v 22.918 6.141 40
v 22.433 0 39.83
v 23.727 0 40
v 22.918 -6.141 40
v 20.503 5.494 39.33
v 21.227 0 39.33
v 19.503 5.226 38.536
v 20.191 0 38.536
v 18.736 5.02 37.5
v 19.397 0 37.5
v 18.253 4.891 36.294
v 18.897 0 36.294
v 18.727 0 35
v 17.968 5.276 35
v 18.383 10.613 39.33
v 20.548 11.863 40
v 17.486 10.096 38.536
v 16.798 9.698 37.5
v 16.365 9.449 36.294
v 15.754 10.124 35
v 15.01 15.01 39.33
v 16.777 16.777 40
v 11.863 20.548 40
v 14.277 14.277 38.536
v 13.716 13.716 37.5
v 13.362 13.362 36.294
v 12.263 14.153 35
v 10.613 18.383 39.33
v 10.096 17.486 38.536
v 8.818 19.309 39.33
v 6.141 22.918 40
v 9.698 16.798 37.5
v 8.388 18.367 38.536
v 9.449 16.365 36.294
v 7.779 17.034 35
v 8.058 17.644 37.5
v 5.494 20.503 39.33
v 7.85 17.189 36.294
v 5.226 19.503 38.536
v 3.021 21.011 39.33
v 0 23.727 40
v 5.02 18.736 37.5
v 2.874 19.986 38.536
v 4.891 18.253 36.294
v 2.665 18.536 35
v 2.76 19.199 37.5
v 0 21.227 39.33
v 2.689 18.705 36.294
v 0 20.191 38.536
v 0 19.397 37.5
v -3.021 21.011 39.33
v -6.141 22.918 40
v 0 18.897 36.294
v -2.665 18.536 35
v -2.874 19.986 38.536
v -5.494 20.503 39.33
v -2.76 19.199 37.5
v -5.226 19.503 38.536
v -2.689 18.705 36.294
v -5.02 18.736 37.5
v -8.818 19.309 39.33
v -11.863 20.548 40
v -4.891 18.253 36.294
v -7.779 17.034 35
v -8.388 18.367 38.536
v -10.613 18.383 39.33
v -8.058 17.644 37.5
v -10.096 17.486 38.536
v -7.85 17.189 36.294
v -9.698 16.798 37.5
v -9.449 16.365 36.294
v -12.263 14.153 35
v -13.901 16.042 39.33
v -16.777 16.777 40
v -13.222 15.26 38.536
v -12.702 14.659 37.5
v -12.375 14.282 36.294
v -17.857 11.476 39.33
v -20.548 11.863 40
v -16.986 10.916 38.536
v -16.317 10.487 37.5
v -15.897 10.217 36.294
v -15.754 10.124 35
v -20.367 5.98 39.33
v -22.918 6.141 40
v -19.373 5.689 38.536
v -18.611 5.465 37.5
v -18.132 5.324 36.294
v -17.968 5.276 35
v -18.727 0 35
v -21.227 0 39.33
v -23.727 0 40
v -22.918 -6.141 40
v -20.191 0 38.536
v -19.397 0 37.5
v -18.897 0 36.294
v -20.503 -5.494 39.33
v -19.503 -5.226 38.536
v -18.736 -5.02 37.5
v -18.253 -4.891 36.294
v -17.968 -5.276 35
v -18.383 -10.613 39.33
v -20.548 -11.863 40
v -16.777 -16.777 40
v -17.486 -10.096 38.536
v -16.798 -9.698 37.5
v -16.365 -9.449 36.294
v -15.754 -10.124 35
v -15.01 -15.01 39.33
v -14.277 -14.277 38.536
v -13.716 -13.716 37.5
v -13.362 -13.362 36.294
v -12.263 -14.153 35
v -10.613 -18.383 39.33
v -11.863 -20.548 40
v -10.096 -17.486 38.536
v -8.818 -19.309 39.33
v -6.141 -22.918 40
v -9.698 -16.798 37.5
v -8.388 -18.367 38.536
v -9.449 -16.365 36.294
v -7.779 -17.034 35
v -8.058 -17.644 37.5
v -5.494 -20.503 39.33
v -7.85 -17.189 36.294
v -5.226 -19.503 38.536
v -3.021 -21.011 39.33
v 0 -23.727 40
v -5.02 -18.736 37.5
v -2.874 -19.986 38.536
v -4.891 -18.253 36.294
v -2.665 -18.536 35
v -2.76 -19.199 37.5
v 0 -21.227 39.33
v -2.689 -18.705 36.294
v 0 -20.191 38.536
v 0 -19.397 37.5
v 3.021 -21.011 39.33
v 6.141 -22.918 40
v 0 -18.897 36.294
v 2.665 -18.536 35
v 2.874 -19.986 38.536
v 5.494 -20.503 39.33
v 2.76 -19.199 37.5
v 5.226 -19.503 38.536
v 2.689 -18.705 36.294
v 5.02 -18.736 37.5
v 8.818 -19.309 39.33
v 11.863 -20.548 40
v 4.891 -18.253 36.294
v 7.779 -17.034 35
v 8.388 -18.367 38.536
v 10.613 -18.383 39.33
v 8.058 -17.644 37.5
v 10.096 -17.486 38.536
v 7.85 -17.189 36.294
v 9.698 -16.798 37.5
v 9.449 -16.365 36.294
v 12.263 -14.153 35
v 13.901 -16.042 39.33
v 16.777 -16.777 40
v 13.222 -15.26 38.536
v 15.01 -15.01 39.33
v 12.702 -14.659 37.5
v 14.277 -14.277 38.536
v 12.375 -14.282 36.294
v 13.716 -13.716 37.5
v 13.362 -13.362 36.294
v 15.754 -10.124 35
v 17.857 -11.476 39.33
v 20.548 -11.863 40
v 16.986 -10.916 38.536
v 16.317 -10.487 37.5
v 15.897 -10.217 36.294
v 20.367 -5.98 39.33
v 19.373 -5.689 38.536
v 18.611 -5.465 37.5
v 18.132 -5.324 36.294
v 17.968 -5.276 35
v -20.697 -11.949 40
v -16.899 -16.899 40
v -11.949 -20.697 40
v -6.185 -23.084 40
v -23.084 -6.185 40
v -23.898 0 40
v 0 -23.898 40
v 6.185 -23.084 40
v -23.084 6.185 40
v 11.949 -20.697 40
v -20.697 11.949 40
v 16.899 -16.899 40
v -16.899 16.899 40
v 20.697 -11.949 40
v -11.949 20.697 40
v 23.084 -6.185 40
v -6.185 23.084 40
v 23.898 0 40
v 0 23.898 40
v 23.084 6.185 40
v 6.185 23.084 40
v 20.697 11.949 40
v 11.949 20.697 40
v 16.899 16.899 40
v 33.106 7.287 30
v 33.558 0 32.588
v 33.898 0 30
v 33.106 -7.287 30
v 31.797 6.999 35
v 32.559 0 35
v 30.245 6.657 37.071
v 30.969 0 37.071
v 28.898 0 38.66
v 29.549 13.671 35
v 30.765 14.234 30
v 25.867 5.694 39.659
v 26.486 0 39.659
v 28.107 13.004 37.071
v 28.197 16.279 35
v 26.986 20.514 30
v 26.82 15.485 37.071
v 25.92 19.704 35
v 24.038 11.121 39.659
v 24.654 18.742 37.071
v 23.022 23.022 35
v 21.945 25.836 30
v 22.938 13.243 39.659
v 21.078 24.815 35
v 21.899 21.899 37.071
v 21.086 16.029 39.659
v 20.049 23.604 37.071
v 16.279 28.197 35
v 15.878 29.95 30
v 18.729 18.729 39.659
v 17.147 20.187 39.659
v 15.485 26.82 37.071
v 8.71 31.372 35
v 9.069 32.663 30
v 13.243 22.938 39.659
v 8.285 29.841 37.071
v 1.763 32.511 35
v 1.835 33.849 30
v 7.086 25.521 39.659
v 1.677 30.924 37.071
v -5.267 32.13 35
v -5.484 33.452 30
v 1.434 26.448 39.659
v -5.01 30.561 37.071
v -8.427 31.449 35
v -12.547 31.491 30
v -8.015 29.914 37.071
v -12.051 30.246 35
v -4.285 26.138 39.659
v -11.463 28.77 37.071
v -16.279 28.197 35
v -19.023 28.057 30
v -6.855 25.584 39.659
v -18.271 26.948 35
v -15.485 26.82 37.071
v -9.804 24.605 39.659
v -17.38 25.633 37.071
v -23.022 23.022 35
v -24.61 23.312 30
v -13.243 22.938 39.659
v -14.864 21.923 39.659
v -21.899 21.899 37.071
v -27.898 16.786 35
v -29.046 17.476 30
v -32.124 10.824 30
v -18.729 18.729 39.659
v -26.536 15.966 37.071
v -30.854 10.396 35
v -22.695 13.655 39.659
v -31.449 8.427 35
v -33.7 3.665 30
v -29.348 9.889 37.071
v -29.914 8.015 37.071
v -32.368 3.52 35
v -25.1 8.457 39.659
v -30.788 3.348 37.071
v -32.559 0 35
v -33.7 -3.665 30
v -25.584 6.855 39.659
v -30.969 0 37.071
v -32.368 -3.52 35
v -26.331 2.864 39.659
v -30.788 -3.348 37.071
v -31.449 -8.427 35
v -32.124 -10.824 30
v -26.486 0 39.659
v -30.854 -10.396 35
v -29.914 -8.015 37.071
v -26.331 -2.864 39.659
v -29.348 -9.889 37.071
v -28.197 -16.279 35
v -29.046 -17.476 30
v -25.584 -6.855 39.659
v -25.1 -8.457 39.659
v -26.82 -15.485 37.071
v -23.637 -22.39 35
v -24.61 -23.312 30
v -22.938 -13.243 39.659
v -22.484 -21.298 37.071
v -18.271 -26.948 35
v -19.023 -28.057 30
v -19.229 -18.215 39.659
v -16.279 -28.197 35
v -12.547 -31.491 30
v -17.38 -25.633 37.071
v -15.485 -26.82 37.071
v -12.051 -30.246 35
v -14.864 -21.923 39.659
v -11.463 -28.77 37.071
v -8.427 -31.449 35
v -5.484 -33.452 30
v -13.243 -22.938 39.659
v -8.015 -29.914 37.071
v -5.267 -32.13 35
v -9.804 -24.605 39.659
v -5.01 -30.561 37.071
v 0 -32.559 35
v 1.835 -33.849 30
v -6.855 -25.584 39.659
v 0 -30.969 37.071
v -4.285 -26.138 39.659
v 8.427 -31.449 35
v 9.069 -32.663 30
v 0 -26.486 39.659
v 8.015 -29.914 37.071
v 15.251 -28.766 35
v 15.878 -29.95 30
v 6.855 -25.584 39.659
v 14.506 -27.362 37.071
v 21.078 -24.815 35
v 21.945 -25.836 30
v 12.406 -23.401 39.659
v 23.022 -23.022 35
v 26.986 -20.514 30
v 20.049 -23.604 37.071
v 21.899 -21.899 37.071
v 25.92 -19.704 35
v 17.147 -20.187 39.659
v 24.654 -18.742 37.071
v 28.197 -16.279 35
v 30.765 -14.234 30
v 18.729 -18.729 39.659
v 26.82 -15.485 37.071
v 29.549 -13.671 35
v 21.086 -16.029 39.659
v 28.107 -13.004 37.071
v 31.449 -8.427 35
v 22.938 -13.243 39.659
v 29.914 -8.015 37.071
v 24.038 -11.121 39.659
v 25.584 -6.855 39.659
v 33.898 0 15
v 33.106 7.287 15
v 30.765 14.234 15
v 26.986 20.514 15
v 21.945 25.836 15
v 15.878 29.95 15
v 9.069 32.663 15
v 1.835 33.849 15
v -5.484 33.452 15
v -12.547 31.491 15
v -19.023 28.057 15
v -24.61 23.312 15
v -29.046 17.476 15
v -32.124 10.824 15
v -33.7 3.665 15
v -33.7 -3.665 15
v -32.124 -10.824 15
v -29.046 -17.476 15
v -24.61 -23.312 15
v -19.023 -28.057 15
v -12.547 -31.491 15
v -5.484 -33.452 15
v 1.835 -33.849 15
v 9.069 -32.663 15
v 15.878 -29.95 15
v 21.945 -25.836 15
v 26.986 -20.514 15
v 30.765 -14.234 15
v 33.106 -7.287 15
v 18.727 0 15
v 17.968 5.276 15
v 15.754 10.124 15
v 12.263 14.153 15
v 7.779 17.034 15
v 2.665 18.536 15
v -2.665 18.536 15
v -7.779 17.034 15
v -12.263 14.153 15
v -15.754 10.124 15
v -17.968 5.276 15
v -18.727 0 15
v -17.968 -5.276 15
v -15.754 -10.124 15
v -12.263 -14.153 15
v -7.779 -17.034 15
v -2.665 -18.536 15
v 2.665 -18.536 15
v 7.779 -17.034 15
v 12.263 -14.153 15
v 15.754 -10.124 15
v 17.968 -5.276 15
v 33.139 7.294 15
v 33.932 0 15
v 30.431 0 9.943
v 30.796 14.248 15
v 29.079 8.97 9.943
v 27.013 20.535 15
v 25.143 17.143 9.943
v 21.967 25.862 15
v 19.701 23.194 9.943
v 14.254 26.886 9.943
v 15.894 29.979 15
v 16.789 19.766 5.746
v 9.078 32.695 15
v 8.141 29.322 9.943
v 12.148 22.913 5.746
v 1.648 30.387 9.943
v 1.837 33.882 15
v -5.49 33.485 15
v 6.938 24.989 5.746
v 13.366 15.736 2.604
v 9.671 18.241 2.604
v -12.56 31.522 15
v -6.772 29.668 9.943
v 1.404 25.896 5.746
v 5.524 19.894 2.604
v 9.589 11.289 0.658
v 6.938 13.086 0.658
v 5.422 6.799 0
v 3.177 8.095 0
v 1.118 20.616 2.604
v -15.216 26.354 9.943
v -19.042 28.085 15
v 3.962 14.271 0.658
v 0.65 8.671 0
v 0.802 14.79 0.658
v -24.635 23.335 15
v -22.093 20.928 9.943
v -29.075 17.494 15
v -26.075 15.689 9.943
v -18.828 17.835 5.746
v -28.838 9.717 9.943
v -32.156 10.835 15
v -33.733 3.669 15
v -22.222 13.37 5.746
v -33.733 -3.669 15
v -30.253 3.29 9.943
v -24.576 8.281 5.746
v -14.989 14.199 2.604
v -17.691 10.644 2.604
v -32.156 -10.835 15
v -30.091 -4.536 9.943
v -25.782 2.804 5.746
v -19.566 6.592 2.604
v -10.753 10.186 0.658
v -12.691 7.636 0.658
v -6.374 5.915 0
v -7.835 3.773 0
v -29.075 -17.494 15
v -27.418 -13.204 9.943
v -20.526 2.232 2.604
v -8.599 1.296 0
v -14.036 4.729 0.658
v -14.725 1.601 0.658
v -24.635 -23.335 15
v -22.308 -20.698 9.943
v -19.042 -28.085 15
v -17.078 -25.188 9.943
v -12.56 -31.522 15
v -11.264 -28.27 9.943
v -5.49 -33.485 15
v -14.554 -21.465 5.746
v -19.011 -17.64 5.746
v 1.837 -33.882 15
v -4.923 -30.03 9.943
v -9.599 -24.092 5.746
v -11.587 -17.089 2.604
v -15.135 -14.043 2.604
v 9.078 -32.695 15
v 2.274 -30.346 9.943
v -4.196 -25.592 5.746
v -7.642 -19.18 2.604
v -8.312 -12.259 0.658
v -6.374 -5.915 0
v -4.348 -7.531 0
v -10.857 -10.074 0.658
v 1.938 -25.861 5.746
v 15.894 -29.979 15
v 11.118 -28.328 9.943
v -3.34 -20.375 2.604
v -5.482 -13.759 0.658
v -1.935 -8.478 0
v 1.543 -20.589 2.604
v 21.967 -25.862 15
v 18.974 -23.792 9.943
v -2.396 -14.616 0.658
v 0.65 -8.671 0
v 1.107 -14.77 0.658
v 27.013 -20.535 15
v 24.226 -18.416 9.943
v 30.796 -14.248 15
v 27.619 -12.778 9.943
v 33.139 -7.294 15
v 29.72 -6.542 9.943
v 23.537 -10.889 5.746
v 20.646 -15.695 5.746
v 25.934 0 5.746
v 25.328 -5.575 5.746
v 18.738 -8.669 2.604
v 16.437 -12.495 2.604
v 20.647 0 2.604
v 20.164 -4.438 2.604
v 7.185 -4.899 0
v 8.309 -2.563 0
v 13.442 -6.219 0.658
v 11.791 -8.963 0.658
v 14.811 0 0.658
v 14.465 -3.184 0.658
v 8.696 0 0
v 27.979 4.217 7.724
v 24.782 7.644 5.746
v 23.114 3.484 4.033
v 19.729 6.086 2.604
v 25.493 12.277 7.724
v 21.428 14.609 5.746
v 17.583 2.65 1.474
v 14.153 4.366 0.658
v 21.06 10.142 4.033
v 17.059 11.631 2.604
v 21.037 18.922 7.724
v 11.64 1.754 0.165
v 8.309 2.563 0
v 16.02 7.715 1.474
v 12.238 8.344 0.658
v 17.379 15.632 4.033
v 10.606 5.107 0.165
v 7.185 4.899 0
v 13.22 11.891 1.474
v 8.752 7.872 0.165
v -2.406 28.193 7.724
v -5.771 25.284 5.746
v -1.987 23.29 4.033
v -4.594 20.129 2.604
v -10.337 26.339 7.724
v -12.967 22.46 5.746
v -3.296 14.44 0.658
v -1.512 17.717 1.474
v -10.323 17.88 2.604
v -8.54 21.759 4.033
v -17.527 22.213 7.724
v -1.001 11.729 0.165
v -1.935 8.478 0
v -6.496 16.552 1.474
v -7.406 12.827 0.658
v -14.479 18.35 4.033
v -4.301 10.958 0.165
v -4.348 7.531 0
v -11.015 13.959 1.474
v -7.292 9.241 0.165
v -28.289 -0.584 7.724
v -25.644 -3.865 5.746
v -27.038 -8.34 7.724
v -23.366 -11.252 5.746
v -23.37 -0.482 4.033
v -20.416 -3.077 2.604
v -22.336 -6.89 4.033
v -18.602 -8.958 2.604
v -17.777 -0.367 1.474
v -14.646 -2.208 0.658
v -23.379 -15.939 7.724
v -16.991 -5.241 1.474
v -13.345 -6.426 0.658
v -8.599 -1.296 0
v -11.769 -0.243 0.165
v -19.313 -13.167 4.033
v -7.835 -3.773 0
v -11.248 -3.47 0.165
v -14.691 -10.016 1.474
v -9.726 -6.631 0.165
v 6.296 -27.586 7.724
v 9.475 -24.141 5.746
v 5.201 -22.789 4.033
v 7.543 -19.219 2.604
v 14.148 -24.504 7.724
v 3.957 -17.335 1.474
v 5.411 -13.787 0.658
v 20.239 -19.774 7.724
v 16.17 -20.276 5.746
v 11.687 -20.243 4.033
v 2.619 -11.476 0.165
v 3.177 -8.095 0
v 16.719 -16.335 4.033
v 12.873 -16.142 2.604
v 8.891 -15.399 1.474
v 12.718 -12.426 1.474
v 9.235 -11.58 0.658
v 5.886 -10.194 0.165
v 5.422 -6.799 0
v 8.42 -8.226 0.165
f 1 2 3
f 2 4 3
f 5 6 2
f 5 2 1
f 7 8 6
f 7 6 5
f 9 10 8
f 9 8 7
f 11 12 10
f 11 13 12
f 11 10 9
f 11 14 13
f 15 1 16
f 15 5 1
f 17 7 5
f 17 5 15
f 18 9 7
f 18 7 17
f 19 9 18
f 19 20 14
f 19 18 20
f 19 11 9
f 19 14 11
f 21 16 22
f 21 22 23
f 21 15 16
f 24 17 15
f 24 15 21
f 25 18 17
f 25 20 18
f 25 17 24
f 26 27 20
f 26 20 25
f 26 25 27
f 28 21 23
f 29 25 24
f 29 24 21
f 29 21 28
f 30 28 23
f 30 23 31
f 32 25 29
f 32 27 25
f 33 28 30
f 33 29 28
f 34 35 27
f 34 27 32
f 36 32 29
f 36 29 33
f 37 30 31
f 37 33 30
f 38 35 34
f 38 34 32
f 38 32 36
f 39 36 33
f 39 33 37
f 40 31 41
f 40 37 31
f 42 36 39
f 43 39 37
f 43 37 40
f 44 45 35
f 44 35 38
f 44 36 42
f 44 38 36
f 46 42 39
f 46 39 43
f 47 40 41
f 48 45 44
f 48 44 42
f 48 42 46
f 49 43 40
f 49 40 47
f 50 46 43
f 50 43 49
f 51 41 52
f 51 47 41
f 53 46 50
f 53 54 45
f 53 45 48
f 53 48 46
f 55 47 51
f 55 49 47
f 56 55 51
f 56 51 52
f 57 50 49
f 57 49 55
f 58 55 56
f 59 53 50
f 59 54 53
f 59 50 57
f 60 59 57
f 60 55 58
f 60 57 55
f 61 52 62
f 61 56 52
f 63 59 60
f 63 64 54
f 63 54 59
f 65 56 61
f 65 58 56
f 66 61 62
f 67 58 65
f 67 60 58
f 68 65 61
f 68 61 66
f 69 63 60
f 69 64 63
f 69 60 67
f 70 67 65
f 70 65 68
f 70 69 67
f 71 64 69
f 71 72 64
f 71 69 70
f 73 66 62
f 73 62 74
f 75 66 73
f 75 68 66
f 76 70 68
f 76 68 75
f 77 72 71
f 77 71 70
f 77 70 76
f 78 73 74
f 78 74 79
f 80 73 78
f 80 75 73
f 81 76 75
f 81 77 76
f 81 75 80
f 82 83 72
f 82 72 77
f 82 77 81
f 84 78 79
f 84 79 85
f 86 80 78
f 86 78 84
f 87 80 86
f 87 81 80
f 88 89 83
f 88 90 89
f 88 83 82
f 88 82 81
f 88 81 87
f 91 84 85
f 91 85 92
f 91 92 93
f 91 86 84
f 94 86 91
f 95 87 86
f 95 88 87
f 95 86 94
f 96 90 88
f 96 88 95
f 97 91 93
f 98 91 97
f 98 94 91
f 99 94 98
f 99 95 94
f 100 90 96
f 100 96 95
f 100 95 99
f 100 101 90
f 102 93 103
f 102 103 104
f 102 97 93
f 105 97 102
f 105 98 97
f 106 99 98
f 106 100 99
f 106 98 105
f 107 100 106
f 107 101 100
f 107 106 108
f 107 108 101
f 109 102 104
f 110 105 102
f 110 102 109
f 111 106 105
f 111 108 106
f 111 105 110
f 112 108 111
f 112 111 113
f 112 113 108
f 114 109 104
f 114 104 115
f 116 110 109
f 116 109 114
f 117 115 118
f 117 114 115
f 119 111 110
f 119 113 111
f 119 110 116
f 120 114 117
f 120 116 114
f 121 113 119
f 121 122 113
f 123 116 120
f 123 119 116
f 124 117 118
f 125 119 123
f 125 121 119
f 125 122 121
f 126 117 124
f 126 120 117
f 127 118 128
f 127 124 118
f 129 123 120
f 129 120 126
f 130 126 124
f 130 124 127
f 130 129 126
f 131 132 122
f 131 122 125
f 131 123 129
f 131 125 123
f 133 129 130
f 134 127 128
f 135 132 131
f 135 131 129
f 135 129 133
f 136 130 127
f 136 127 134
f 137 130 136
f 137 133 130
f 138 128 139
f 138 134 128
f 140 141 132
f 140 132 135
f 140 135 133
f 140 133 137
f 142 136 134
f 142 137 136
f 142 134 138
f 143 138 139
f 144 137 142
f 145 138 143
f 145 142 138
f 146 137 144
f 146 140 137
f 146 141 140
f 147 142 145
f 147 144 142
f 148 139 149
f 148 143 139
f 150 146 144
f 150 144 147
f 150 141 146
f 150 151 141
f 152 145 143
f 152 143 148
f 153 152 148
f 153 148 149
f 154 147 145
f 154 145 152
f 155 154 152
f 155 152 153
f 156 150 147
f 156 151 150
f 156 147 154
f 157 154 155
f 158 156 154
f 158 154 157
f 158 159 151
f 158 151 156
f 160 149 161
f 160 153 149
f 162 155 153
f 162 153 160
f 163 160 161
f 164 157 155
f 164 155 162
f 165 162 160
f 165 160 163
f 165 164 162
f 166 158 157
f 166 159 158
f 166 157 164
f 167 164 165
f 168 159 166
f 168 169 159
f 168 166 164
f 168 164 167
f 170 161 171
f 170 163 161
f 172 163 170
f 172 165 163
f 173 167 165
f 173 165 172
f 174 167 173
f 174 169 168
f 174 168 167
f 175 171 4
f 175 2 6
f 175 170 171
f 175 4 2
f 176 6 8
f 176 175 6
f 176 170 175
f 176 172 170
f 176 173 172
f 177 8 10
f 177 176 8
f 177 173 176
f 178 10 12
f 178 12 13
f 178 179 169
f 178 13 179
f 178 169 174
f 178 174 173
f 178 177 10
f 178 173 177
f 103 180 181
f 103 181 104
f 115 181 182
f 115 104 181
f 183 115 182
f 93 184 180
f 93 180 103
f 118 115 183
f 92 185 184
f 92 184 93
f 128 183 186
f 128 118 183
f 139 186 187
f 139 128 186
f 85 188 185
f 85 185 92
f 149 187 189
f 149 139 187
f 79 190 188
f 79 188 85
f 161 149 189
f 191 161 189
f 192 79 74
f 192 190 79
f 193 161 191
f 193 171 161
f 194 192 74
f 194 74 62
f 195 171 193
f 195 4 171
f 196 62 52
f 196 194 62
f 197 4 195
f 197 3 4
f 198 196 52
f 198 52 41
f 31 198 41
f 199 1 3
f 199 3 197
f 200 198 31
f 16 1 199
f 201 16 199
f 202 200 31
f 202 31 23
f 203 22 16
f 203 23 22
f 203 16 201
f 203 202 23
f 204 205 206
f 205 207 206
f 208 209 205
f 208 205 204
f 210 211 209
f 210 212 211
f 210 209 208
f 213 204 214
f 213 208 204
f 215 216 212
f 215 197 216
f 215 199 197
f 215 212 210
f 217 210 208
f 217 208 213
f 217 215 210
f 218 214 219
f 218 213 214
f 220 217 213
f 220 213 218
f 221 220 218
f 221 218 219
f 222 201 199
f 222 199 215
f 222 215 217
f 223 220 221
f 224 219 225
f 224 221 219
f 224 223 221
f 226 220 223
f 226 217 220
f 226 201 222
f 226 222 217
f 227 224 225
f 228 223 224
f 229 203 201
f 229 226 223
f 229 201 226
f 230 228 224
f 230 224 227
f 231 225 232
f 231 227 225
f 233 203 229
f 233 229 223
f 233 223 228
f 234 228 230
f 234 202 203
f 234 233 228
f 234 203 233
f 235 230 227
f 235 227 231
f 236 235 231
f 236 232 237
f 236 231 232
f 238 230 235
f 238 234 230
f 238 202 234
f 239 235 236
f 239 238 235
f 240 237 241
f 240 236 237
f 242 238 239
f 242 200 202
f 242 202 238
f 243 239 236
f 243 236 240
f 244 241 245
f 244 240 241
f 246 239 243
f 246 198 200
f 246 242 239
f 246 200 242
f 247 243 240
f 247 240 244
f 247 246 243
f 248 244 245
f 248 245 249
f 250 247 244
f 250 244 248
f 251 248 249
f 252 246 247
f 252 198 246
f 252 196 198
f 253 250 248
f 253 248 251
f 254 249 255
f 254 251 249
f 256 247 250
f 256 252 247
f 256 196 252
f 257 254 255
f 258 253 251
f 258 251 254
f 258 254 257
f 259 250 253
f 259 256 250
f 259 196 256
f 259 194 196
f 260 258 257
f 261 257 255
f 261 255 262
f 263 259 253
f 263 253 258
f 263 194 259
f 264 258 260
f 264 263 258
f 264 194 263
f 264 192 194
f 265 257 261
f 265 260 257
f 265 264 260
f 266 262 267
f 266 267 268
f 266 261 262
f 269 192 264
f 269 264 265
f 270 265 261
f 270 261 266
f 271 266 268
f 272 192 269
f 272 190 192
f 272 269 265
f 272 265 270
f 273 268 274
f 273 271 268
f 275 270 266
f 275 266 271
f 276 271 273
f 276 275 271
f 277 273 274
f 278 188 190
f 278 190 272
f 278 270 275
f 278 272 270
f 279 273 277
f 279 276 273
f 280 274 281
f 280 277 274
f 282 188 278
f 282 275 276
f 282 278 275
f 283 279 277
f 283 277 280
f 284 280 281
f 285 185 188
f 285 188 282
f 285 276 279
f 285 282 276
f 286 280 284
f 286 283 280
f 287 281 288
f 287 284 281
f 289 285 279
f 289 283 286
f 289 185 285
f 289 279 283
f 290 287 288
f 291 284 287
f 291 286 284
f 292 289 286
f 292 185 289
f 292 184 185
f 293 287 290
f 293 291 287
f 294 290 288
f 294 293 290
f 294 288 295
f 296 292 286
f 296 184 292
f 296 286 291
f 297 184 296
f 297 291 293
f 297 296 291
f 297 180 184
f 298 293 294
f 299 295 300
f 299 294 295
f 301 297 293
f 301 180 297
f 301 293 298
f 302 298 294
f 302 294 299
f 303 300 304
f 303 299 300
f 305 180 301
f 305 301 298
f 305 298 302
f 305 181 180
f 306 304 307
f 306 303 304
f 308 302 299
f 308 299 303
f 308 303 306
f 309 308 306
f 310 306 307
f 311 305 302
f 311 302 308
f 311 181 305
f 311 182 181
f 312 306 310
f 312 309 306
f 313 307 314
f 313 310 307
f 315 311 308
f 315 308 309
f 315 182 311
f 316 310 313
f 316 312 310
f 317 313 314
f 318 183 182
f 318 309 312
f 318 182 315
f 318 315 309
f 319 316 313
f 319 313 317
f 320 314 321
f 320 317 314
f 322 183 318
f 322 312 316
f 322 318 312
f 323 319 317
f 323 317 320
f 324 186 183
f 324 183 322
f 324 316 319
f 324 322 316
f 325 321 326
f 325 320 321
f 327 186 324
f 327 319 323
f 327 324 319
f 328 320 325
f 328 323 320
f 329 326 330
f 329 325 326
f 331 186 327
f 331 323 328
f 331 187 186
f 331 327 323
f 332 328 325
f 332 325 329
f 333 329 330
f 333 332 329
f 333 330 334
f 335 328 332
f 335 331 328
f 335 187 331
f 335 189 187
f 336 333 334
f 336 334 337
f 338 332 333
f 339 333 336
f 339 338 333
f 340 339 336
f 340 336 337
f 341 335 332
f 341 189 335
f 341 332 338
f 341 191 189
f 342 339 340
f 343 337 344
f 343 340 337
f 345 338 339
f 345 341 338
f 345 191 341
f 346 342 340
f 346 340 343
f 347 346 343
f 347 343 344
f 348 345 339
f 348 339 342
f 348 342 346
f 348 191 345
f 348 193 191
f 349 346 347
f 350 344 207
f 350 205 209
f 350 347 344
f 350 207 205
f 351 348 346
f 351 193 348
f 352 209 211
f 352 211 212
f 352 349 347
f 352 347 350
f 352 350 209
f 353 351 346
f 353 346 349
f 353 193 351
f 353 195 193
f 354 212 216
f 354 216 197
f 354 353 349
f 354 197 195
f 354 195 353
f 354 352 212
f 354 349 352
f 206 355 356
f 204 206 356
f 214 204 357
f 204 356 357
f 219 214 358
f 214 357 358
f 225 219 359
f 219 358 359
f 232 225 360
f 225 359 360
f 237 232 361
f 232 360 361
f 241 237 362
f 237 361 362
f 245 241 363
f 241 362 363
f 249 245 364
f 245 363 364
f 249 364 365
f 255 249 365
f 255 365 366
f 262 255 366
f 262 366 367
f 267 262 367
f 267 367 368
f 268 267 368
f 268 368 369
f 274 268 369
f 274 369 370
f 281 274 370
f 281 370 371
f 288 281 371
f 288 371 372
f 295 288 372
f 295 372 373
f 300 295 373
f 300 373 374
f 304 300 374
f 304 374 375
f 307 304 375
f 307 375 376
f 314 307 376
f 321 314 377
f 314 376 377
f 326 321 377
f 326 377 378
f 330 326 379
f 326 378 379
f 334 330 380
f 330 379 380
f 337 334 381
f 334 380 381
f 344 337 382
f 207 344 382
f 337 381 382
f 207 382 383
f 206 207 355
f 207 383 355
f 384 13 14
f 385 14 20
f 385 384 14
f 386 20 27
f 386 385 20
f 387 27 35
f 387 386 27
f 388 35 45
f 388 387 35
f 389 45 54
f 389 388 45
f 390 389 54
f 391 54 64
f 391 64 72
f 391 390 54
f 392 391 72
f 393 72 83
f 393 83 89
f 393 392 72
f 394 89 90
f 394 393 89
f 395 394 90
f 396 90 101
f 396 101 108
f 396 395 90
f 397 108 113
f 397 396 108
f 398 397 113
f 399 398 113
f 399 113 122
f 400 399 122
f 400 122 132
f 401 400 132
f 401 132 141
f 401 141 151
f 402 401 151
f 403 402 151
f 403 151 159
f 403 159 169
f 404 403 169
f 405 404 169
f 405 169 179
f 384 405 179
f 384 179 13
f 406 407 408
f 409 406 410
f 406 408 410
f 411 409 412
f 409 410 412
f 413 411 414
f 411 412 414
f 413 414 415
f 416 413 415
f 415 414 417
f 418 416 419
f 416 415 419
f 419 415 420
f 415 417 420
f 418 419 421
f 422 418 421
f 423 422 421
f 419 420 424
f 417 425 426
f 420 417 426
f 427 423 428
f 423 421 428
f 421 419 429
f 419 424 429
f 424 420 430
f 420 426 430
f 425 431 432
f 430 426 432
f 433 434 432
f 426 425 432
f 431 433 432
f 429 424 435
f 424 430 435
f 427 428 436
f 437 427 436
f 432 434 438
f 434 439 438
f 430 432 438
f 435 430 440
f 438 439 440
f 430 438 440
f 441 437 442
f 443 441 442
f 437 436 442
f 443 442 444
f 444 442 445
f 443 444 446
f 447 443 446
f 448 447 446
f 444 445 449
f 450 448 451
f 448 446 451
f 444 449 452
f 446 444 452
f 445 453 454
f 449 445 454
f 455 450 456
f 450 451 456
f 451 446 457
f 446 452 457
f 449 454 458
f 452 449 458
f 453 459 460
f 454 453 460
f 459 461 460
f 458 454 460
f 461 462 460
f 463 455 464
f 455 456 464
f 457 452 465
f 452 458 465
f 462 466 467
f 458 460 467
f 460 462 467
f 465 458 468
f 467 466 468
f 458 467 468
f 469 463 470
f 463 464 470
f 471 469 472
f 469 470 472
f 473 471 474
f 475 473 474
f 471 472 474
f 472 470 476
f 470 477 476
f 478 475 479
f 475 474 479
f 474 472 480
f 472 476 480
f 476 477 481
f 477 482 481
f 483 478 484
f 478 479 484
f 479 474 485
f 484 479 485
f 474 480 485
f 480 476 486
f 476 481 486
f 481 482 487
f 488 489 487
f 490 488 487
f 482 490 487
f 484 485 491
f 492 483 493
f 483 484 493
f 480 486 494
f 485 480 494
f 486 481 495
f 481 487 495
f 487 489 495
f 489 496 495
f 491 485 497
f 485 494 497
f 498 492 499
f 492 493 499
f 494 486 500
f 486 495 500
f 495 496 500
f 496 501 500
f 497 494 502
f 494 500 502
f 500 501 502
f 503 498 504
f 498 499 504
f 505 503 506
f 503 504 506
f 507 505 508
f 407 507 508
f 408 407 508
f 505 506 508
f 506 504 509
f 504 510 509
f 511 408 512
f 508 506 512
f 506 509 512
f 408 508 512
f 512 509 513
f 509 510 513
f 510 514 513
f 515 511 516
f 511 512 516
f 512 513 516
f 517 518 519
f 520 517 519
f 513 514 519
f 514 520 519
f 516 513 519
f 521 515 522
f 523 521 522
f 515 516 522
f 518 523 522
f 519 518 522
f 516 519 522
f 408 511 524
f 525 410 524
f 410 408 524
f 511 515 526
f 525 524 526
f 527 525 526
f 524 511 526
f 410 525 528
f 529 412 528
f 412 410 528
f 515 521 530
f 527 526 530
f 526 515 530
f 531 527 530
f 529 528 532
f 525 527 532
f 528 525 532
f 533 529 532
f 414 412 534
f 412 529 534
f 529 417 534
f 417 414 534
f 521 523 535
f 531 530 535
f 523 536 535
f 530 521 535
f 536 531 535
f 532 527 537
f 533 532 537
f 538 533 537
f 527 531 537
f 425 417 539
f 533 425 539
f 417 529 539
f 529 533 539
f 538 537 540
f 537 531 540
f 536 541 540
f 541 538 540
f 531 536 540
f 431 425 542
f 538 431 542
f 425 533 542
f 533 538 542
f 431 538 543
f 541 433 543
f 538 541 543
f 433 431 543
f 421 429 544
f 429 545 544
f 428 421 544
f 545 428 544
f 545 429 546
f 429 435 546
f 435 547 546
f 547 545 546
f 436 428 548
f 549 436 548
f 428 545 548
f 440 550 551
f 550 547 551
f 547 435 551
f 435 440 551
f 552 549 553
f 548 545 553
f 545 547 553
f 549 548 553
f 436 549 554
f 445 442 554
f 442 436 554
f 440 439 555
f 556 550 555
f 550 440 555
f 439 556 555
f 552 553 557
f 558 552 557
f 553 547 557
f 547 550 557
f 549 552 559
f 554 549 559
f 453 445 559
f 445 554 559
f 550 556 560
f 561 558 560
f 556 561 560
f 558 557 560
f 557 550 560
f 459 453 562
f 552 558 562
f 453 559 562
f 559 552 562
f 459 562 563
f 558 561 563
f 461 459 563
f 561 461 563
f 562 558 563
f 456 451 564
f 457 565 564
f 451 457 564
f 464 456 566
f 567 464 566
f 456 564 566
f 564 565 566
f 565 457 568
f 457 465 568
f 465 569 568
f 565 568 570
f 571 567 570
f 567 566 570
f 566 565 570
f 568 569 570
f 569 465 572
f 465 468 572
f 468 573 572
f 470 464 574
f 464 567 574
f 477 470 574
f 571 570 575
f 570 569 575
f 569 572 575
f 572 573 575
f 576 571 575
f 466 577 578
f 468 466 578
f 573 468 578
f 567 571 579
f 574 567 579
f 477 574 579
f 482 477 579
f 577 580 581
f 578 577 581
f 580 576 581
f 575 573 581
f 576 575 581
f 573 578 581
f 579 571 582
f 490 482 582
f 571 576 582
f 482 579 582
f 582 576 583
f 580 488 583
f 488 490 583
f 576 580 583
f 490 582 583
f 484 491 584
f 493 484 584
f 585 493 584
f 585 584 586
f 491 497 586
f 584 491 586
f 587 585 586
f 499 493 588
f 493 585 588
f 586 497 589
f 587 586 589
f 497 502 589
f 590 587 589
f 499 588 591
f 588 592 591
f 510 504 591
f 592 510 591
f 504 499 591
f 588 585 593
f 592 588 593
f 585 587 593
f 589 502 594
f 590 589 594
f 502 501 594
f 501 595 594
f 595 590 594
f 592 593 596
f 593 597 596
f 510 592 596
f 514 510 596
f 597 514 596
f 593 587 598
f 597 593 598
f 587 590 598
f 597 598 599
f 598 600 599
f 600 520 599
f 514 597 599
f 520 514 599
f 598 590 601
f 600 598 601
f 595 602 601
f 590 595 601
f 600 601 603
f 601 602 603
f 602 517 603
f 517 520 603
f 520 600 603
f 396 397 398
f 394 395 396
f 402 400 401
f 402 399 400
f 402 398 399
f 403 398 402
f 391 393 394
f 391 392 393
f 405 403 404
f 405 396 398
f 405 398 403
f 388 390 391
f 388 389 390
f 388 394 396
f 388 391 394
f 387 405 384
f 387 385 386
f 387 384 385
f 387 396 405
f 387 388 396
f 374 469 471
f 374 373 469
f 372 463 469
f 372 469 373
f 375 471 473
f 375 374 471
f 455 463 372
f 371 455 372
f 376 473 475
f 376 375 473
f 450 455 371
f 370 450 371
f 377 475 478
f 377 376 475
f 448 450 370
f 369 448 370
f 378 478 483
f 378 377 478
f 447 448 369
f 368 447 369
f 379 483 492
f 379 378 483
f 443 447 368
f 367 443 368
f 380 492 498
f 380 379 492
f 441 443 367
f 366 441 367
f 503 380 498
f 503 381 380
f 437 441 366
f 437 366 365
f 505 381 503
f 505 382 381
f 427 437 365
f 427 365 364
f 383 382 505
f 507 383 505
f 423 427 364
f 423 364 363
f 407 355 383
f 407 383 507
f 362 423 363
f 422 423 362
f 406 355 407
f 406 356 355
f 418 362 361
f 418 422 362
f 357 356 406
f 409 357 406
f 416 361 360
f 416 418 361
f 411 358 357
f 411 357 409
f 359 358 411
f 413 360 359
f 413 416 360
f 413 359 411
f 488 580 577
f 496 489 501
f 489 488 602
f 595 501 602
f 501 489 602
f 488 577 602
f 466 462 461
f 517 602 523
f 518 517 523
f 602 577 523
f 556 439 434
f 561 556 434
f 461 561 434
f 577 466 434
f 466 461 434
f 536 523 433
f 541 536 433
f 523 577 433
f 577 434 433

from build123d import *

# Parameters (mm, degrees)
F0_R     = 33.8982818127
F0_R_2   = 18.7267733827
F1_DEPTH = 40
F2_R     = 33.9321571181
F3_DEPTH = 15
F4_R     = 10
F5_R     = 5


# Not quite as in the source:
# - a fillet or chamfer that OpenCascade refuses, or shapes differently, is made with other operations: its cross-section is extruded or revolved along the edge and cut away or added


with BuildPart() as f1:
    # F0 (on Top) → F1 (new body)
    with BuildSketch(Plane.XY):
        Circle(F0_R)
        Circle(F0_R_2, mode=Mode.SUBTRACT)
    extrude(amount=F1_DEPTH)

    # F2 (on Top) → F3 (join)
    with BuildSketch(Plane.XY):
        Circle(F2_R)
    extrude(amount=F3_DEPTH)

    # F4
    f4_edges = [f1.edges().sort_by_distance(p)[0] for p in [
        (-33.898282, 0, 40),
    ]]
    fillet(f4_edges, radius=F4_R)

    # F5
    f5_edges = [f1.edges().sort_by_distance(p)[0] for p in [
        (-18.726773, 0, 40),
    ]]
    fillet(f5_edges, radius=F5_R)

    # F6: fillet of radius 28.7291413922 on 1 edges, made by hand

    # F6_s1 → F6_t2 (revolve, cut)
    with BuildSketch(Plane.XZ):
        with BuildLine():
            ThreePointArc((33.9321571181, 15), (23.3746370554, 4.0330889811), (8.6957896741, 0))
            Line((8.6957896741, 0), (33.9321571181, 0))
            Line((33.9321571181, 0), (33.9321571181, 15))
        make_face()
    revolve(axis=Axis((0, 0, 0), (0, 0, 1)), mode=Mode.SUBTRACT)


solid = f1.part
